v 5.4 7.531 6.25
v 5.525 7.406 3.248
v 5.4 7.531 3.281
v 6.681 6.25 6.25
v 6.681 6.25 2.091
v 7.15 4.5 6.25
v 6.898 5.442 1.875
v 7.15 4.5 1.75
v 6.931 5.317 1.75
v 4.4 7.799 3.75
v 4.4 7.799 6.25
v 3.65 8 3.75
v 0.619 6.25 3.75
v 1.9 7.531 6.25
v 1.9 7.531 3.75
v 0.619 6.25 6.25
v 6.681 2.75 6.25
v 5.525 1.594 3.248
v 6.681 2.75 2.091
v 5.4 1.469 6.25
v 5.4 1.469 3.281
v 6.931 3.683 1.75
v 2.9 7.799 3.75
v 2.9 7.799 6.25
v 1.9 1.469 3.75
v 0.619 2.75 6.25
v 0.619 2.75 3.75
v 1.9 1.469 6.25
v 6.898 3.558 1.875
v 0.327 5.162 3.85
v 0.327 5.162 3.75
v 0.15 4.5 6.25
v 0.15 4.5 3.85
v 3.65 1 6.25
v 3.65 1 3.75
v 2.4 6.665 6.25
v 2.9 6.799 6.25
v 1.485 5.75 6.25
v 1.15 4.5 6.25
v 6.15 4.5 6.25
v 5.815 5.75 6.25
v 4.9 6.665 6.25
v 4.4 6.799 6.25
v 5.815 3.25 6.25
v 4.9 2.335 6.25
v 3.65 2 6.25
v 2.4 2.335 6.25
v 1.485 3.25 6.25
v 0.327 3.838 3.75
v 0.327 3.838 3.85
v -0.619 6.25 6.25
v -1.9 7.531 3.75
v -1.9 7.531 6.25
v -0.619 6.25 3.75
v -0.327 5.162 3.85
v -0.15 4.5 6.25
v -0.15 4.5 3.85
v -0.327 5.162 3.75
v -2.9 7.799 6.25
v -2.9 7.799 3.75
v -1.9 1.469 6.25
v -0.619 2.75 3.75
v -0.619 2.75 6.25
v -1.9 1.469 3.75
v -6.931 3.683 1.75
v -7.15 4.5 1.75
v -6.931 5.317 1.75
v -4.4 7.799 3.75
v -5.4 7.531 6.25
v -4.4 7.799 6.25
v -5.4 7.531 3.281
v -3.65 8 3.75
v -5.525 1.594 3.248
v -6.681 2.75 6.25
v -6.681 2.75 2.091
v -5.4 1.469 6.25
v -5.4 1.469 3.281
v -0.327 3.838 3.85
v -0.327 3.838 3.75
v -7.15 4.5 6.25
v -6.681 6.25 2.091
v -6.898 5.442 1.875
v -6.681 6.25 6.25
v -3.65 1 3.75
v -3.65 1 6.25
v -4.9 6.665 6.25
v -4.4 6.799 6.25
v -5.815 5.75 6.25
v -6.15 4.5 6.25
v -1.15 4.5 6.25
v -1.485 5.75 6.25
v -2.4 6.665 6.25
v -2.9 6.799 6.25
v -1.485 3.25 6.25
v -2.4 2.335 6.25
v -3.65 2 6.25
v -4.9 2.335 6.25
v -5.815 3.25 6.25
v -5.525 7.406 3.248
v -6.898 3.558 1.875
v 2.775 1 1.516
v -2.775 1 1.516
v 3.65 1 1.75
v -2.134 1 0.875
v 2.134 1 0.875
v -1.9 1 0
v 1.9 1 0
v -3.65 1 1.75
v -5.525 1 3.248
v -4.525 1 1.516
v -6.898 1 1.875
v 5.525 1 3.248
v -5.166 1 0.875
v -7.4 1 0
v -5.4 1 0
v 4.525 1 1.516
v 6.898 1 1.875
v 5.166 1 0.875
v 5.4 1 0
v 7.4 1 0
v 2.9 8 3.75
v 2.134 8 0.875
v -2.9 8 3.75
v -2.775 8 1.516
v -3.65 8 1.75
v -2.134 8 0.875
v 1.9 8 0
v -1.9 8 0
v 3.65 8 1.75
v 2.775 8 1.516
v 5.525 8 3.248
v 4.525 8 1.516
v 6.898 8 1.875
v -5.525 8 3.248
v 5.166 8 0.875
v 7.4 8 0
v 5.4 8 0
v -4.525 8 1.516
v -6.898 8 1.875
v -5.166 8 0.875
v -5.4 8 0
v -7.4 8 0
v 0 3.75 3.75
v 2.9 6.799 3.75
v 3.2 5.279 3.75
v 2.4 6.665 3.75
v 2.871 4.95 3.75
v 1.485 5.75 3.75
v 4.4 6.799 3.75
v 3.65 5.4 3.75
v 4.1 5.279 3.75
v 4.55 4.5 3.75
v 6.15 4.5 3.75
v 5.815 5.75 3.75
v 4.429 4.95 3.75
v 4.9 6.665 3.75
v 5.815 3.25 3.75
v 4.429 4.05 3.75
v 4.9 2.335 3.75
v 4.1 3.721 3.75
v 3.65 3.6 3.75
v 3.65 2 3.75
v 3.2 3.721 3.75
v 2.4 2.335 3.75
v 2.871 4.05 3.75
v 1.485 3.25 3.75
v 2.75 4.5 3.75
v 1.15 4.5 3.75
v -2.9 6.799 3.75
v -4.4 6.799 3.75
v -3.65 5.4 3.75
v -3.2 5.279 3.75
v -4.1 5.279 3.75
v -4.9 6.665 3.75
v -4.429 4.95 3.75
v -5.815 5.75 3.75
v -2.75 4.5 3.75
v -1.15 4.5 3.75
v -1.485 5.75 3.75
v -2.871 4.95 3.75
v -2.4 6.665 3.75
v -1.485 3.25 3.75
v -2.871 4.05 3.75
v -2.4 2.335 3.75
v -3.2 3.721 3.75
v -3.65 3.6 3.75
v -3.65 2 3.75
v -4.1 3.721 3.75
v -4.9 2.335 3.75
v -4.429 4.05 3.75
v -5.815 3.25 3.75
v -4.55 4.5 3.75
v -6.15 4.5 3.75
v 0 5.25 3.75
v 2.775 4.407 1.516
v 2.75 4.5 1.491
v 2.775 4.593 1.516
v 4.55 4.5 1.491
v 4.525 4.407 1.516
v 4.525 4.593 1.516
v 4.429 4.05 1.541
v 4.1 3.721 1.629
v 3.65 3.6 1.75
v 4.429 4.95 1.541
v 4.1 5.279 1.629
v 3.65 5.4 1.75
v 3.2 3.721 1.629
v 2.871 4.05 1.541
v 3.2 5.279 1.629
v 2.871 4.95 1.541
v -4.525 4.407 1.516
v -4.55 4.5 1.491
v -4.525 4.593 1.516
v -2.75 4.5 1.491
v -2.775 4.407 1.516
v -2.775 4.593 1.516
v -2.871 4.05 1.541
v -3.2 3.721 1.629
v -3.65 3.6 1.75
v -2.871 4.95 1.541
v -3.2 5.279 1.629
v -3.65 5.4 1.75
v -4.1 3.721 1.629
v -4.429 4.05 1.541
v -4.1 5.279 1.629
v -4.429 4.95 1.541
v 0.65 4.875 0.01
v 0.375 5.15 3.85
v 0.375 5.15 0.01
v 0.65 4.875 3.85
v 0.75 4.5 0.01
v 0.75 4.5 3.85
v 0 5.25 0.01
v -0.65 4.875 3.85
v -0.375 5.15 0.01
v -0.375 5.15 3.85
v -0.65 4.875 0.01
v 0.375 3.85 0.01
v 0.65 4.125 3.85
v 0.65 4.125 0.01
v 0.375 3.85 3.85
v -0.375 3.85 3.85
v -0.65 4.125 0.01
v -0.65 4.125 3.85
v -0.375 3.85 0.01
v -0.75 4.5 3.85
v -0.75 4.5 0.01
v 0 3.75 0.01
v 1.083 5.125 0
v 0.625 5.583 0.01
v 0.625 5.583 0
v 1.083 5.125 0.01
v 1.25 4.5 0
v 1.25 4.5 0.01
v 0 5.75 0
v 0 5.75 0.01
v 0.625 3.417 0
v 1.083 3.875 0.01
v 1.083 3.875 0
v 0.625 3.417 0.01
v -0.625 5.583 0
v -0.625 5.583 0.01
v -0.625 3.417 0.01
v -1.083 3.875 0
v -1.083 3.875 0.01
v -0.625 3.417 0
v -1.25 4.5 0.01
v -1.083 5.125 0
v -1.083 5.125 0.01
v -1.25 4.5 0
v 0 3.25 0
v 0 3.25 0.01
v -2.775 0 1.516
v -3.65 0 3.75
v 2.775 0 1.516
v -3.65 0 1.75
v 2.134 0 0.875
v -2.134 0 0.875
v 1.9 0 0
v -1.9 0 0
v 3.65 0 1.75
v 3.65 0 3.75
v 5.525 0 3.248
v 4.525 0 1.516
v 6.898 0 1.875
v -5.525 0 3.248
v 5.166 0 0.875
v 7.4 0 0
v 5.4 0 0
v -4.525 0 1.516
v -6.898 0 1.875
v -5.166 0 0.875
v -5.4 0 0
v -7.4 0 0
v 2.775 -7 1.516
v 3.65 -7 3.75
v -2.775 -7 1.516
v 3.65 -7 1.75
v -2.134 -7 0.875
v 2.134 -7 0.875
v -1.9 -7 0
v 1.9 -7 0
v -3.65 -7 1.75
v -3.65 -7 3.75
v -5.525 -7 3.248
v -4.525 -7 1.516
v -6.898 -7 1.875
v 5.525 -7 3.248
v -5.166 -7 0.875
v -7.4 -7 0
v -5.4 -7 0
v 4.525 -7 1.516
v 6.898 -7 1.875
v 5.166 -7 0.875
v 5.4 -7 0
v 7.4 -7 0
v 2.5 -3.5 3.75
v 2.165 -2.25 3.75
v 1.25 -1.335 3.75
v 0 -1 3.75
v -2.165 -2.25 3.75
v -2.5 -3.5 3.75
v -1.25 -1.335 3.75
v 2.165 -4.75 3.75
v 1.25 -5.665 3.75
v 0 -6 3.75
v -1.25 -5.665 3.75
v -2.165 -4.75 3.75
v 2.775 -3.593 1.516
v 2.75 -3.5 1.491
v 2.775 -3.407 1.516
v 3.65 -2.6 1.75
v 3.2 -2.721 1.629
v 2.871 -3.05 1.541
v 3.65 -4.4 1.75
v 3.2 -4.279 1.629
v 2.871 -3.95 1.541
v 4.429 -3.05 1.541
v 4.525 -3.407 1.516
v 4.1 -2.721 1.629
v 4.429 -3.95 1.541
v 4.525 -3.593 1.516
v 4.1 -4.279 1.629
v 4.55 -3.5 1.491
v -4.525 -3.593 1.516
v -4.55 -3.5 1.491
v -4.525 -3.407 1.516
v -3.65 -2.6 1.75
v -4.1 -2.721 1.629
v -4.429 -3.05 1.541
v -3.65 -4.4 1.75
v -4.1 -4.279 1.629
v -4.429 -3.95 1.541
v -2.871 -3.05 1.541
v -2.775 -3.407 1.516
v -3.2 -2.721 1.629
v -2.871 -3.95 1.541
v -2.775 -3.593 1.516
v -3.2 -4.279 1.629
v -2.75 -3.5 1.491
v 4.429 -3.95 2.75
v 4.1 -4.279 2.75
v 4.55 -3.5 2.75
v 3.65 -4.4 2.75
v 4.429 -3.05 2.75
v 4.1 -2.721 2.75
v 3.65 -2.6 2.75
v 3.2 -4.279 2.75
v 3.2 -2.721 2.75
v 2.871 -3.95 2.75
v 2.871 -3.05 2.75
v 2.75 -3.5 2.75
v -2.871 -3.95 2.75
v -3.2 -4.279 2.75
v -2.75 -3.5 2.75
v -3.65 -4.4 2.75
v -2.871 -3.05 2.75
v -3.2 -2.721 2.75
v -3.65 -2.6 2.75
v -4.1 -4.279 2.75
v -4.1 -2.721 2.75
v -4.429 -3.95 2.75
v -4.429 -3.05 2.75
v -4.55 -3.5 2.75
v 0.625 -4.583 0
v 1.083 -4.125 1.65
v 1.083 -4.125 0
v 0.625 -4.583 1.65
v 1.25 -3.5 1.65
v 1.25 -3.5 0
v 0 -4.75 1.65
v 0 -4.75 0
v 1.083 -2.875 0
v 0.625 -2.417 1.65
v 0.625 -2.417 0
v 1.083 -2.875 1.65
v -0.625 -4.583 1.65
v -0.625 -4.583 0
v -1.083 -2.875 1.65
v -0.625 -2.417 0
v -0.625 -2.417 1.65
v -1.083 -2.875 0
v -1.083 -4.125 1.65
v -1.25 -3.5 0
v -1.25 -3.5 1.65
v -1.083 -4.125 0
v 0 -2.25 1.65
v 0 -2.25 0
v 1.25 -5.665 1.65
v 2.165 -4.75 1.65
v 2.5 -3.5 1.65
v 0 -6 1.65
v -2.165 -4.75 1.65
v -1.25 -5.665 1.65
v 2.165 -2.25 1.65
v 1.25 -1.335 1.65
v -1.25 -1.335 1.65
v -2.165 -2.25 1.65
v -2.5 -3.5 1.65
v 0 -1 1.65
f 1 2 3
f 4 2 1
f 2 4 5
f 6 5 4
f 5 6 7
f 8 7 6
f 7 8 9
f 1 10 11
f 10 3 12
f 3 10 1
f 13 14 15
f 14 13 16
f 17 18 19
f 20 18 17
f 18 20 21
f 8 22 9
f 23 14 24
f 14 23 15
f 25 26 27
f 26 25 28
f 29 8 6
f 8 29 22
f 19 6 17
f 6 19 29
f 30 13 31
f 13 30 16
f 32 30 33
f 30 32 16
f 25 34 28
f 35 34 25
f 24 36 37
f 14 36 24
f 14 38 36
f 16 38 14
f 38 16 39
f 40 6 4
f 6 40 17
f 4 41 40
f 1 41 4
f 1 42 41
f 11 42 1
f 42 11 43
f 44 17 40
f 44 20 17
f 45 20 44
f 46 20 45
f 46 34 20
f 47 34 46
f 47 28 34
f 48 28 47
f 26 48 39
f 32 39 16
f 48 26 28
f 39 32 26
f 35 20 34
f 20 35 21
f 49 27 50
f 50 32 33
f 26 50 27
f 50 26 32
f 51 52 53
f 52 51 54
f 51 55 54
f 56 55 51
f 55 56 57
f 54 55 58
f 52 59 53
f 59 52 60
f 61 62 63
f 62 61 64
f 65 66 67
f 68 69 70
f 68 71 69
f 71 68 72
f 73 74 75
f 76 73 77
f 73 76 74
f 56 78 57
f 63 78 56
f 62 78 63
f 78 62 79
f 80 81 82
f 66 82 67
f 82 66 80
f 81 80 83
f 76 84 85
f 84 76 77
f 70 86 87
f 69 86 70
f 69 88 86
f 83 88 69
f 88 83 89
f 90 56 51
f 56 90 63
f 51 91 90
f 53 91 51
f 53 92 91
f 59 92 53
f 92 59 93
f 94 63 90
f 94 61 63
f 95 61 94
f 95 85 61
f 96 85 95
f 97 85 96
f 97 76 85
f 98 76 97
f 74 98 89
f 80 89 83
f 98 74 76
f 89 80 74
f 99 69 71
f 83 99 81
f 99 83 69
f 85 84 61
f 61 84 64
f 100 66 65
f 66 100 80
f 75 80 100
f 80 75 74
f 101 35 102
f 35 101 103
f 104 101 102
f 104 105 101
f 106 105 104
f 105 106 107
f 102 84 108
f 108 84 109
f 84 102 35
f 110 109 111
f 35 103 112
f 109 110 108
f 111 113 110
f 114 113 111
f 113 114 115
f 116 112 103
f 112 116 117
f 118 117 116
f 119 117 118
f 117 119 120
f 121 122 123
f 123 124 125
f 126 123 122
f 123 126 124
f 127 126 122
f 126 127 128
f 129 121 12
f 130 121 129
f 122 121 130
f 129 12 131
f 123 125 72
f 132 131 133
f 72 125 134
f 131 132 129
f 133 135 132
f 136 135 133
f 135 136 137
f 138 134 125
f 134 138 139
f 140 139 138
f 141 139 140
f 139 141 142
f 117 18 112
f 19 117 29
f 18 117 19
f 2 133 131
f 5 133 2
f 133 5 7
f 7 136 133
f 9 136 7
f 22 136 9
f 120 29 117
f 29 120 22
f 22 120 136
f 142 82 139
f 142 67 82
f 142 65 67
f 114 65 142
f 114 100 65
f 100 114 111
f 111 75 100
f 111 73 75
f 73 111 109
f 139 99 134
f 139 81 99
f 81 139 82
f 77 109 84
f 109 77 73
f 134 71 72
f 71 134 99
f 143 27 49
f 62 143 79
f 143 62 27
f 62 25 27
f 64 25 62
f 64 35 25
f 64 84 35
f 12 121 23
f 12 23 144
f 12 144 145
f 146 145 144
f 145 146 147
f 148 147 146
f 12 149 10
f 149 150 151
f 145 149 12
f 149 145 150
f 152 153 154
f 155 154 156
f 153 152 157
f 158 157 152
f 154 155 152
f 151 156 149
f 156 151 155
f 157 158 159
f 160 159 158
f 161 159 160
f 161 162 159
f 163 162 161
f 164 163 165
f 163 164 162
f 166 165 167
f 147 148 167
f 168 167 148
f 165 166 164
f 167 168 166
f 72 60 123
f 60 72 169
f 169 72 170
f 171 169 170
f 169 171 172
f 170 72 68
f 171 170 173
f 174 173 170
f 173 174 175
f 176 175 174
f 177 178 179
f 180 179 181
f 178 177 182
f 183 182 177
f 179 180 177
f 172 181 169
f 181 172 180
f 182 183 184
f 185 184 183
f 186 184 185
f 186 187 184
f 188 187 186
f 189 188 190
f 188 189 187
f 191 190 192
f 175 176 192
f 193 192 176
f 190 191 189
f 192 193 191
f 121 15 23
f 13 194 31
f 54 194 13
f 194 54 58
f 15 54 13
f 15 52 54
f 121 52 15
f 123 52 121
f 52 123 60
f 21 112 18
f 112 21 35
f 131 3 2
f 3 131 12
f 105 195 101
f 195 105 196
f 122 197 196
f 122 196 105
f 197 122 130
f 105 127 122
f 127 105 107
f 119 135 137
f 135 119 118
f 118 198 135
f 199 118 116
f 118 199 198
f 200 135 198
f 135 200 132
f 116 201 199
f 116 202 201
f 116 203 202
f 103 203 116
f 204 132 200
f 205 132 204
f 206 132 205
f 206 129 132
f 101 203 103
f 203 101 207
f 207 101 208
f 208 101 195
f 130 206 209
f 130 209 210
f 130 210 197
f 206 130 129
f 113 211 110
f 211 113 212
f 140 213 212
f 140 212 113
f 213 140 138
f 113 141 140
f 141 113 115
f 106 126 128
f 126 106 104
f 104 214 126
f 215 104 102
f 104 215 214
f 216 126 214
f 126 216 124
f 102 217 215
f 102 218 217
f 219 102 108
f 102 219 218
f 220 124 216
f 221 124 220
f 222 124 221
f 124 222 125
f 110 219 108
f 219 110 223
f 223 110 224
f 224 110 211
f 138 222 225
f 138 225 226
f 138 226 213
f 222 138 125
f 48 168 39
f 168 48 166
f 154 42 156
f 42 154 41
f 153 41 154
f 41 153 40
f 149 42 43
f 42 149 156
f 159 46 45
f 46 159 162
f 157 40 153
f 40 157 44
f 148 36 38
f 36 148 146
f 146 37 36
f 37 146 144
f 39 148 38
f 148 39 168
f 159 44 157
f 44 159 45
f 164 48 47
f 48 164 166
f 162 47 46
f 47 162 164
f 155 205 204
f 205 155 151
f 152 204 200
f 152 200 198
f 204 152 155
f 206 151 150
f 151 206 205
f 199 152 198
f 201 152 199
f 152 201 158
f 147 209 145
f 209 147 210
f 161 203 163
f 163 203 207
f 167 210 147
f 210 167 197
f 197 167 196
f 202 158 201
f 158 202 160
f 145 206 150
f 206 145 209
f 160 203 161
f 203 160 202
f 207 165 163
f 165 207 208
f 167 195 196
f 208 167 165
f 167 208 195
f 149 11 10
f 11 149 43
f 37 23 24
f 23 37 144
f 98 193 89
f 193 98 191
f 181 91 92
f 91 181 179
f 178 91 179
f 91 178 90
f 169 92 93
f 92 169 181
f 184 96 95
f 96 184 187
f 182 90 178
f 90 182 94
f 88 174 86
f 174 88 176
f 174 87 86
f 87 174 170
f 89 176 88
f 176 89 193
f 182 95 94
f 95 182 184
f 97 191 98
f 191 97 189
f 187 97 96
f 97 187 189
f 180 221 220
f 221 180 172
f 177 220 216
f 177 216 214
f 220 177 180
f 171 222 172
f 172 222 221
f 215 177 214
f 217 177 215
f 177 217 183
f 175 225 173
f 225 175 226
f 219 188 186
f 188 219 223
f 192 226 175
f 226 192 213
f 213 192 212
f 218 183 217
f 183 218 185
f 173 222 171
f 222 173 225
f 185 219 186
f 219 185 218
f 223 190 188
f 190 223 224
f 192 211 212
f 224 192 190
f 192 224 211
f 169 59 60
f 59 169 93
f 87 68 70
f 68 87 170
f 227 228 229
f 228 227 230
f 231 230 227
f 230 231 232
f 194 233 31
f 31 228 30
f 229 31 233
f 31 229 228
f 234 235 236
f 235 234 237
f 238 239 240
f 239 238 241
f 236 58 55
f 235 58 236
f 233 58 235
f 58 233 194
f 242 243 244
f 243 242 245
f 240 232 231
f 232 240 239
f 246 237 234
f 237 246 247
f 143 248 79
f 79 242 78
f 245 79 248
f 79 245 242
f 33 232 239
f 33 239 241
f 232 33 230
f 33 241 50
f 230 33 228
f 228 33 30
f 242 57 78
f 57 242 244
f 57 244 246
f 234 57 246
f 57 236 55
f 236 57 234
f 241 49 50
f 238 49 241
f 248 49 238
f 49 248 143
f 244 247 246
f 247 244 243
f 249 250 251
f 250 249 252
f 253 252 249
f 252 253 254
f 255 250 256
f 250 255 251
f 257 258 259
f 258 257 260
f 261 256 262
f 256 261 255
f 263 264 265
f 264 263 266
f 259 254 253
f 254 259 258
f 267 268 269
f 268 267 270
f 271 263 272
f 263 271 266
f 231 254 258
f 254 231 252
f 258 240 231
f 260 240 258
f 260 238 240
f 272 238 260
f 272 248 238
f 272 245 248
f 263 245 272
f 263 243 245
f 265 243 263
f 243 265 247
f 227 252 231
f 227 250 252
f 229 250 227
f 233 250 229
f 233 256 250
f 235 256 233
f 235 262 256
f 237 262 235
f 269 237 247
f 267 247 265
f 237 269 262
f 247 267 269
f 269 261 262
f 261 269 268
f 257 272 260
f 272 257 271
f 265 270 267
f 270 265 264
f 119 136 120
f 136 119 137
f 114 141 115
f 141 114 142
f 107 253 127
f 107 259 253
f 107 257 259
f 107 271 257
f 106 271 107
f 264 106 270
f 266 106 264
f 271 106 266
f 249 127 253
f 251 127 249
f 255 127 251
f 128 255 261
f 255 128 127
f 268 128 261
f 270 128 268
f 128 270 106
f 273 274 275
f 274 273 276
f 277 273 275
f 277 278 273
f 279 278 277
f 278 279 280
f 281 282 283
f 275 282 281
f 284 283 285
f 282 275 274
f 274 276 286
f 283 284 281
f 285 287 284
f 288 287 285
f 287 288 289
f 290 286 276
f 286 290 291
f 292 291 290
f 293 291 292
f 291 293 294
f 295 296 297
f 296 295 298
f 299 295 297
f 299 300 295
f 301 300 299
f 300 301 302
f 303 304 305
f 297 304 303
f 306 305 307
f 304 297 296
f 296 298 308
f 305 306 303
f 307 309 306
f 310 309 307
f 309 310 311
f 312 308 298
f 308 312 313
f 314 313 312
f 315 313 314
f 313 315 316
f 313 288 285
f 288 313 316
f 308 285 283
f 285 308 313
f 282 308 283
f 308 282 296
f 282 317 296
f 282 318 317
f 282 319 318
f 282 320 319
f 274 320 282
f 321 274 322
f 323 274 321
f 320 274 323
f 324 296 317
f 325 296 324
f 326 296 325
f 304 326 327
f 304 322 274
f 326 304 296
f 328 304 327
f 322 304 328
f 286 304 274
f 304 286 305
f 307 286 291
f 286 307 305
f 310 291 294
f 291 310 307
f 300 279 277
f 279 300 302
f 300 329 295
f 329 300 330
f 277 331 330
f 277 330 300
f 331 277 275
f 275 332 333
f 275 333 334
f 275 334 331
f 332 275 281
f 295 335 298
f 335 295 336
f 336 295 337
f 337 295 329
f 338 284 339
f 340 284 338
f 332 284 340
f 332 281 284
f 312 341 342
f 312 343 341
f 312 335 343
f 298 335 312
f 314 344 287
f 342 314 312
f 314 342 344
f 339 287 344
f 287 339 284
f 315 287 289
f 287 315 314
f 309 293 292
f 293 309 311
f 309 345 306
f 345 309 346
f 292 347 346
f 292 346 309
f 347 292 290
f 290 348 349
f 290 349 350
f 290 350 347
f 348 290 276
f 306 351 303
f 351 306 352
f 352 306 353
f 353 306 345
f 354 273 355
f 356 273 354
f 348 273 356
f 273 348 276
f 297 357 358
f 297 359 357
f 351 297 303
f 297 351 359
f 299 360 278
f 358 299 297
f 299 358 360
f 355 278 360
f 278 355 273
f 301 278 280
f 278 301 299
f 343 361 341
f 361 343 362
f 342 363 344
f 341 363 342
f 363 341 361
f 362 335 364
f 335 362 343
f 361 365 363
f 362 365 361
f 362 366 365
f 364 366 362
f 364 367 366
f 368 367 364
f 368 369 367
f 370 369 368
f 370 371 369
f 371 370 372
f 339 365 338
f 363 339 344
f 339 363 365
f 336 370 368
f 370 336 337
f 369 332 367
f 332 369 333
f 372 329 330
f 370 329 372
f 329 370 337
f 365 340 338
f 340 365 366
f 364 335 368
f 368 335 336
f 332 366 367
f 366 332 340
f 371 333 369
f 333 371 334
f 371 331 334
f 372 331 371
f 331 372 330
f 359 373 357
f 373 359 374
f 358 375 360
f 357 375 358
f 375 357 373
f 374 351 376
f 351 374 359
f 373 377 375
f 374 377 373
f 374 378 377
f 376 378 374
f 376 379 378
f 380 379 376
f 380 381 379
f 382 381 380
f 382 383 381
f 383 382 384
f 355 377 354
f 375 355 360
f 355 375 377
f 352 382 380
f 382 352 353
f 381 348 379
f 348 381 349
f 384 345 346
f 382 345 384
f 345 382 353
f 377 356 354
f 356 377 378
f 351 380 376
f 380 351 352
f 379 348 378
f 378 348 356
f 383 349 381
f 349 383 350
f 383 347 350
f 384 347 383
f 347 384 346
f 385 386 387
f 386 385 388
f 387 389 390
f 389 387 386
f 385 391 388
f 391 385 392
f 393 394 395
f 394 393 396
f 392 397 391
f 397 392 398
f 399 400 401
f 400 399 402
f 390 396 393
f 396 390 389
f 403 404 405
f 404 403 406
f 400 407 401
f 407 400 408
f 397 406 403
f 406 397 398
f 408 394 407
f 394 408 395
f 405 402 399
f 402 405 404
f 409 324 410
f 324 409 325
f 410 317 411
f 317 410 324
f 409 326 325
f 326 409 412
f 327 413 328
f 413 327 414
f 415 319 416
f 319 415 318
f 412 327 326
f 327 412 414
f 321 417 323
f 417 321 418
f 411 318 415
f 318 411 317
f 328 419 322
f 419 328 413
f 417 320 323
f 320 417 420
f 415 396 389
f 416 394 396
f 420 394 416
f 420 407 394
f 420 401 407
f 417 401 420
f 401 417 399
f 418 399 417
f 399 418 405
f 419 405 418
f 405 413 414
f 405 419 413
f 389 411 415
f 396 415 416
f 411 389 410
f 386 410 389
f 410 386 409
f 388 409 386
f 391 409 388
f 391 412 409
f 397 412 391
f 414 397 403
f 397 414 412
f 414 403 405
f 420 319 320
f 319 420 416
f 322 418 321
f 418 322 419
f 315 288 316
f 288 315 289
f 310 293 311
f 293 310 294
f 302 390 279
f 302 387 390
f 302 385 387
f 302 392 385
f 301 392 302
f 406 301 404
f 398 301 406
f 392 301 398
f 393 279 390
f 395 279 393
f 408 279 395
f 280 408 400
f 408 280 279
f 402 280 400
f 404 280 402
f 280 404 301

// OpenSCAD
// file: gardenLightSplicer.scad
/*
    For my dual-mode (ambiant solar / bright wired) garden lights, I needed to splice into the 12V cable
    running around my garden (damaging it as little as possible).
    
    The cable is quite thick, and the wires to the LEDs is thin.
    
    Each piece needs three screws. One holds the two halves together. The other two to pierce the
    cable's plastic, touching the conductor, and simultaneously clamping the thin wires to the LEDs.
    
Print Notes
===========
I printed these with PLA, but this may degrade in an outside environment, ABS would be a better choice.
Time will tell.

*/

length=7; // The length of the body, which is fairly arbitrary
d=3.5; // The diameter of holes, through which the main wires pass
thickness=2; // Thickness of plastic around the main wires
gap=3.8; // Distance between the holes for the main wires
mainHole=1.5; // Diameter of the hole to join the two halves together
head=5; // Diameter allowed for the connecting screws
hole=1.8; // Diameter of the holes for the connecting screws
headHeight=2.5; // Height of the "turret", a little larger than the connecting screw's head height
recess=2.2;
wire=1.5; // Width of the slot for the small conneting wires
turretThickness=2;

sides=12; // Number of faces for each of the holes.

module splicer()
{
	// Positions the children into the two positions of the connection "turrets".
	module connectionPositions()
	{
		translate( [(gap+d)/2,-d/2,length/2] ) rotate( [90,0,0] )
		children();

		translate( [-(gap+d)/2,-d/2,length/2] ) rotate( [90,0,0] )
		children();
	}

	// The positive part of the connection turret
	module connections()
	{
		connectionPositions() cylinder( d=head+turretThickness,h=thickness+headHeight,$fn=sides );
	}

	// The negative part of the connection turret
	module connectionHoles()
	{
		connectionPositions() {
			translate([0,0,thickness]) cylinder( d=head,h=headHeight+0.1, $fn=sides );
			translate([0,0,-d-thickness/2]) cylinder( d=hole, h=10, $fn=sides);
			translate( [-wire/2,0,thickness] ) cube( [wire,10,10] );
		}
	}

	module main() {

		linear_extrude( length, convexity=10) {
			difference() {
				hull(convexity=10) {
					translate([ (d + gap)/2,0]) circle( d=d + thickness*2, $fn=sides );
					translate([-(d + gap)/2,0]) circle( d=d + thickness*2, $fn=sides );
				}

				union(convexity=10) {
					translate([ (d + gap)/2,0]) circle( d=d, $fn=sides );
					translate([-(d + gap)/2,0]) circle( d=d, $fn=sides );
				}
			}
		}
	}

	difference() {
		union() {
			main();
			connections();
		}

		// Hole to screw the two halves together
		translate( [0,d/2+thickness+0.1,length/2] ) rotate([90,0,0]) cylinder( d=mainHole, h=d+thickness*2+0.2, $fn=sides );
		// Larger hole on the head side (so the screw only bites one half).
		translate( [0,d/2+thickness-0.01,length/2] ) rotate([90,0,0]) cylinder( d=mainHole+1, h=(d+thickness*2)/2, $fn=sides );
		// Recess for the screw head.
		translate( [0,d/2+thickness+0.1,length/2] ) rotate([90,0,0]) cylinder( d=head, h=recess, $fn=sides );

		connectionHoles();
	}
}

// Cuts the model in two pieces, discarding the bottom half.
module topHalf() {

	rotate( [-90,0,0] )
	difference() {
		children();
		translate( [-10,0,-1] ) cube(20);
	}
}

// Cuts the model in two pieces, discarding the top half.
module bottomHalf() {
	rotate( [90,0,0] )
	difference() {
		children();
		translate( [-10,-20,-1] ) cube(20);
	}
}

// Used to visualise the size of the screw. Will never be printed!
// #translate( [8,4,3/2+thickness] ) screw();

module screw() {
	translate( [0,0,-6] ) cylinder( d=2.2, h=6 );
	cylinder( d=4.2, h=1.8 );
}

module bothHalves()
{
    translate([0,1,0]) topHalf() splicer();
    bottomHalf() splicer();
}


// Uncomment for a smaller version (I have two cable sizes in my garden).
//d=2.5;
//thickness=2.5;


// Uncomment to print  batch of 12
//include <ntc/ntc_tools.scad>;
//ntc_arrange_grid( 4,20, 3, 20 )

bothHalves();
// main file
include <gardenLightSplicer.scad>;

// Uncomment to print  batch of 12
//include <ntc/ntc_tools.scad>;
//ntc_arrange_grid( 4,20, 3, 20 )

bothHalves();
